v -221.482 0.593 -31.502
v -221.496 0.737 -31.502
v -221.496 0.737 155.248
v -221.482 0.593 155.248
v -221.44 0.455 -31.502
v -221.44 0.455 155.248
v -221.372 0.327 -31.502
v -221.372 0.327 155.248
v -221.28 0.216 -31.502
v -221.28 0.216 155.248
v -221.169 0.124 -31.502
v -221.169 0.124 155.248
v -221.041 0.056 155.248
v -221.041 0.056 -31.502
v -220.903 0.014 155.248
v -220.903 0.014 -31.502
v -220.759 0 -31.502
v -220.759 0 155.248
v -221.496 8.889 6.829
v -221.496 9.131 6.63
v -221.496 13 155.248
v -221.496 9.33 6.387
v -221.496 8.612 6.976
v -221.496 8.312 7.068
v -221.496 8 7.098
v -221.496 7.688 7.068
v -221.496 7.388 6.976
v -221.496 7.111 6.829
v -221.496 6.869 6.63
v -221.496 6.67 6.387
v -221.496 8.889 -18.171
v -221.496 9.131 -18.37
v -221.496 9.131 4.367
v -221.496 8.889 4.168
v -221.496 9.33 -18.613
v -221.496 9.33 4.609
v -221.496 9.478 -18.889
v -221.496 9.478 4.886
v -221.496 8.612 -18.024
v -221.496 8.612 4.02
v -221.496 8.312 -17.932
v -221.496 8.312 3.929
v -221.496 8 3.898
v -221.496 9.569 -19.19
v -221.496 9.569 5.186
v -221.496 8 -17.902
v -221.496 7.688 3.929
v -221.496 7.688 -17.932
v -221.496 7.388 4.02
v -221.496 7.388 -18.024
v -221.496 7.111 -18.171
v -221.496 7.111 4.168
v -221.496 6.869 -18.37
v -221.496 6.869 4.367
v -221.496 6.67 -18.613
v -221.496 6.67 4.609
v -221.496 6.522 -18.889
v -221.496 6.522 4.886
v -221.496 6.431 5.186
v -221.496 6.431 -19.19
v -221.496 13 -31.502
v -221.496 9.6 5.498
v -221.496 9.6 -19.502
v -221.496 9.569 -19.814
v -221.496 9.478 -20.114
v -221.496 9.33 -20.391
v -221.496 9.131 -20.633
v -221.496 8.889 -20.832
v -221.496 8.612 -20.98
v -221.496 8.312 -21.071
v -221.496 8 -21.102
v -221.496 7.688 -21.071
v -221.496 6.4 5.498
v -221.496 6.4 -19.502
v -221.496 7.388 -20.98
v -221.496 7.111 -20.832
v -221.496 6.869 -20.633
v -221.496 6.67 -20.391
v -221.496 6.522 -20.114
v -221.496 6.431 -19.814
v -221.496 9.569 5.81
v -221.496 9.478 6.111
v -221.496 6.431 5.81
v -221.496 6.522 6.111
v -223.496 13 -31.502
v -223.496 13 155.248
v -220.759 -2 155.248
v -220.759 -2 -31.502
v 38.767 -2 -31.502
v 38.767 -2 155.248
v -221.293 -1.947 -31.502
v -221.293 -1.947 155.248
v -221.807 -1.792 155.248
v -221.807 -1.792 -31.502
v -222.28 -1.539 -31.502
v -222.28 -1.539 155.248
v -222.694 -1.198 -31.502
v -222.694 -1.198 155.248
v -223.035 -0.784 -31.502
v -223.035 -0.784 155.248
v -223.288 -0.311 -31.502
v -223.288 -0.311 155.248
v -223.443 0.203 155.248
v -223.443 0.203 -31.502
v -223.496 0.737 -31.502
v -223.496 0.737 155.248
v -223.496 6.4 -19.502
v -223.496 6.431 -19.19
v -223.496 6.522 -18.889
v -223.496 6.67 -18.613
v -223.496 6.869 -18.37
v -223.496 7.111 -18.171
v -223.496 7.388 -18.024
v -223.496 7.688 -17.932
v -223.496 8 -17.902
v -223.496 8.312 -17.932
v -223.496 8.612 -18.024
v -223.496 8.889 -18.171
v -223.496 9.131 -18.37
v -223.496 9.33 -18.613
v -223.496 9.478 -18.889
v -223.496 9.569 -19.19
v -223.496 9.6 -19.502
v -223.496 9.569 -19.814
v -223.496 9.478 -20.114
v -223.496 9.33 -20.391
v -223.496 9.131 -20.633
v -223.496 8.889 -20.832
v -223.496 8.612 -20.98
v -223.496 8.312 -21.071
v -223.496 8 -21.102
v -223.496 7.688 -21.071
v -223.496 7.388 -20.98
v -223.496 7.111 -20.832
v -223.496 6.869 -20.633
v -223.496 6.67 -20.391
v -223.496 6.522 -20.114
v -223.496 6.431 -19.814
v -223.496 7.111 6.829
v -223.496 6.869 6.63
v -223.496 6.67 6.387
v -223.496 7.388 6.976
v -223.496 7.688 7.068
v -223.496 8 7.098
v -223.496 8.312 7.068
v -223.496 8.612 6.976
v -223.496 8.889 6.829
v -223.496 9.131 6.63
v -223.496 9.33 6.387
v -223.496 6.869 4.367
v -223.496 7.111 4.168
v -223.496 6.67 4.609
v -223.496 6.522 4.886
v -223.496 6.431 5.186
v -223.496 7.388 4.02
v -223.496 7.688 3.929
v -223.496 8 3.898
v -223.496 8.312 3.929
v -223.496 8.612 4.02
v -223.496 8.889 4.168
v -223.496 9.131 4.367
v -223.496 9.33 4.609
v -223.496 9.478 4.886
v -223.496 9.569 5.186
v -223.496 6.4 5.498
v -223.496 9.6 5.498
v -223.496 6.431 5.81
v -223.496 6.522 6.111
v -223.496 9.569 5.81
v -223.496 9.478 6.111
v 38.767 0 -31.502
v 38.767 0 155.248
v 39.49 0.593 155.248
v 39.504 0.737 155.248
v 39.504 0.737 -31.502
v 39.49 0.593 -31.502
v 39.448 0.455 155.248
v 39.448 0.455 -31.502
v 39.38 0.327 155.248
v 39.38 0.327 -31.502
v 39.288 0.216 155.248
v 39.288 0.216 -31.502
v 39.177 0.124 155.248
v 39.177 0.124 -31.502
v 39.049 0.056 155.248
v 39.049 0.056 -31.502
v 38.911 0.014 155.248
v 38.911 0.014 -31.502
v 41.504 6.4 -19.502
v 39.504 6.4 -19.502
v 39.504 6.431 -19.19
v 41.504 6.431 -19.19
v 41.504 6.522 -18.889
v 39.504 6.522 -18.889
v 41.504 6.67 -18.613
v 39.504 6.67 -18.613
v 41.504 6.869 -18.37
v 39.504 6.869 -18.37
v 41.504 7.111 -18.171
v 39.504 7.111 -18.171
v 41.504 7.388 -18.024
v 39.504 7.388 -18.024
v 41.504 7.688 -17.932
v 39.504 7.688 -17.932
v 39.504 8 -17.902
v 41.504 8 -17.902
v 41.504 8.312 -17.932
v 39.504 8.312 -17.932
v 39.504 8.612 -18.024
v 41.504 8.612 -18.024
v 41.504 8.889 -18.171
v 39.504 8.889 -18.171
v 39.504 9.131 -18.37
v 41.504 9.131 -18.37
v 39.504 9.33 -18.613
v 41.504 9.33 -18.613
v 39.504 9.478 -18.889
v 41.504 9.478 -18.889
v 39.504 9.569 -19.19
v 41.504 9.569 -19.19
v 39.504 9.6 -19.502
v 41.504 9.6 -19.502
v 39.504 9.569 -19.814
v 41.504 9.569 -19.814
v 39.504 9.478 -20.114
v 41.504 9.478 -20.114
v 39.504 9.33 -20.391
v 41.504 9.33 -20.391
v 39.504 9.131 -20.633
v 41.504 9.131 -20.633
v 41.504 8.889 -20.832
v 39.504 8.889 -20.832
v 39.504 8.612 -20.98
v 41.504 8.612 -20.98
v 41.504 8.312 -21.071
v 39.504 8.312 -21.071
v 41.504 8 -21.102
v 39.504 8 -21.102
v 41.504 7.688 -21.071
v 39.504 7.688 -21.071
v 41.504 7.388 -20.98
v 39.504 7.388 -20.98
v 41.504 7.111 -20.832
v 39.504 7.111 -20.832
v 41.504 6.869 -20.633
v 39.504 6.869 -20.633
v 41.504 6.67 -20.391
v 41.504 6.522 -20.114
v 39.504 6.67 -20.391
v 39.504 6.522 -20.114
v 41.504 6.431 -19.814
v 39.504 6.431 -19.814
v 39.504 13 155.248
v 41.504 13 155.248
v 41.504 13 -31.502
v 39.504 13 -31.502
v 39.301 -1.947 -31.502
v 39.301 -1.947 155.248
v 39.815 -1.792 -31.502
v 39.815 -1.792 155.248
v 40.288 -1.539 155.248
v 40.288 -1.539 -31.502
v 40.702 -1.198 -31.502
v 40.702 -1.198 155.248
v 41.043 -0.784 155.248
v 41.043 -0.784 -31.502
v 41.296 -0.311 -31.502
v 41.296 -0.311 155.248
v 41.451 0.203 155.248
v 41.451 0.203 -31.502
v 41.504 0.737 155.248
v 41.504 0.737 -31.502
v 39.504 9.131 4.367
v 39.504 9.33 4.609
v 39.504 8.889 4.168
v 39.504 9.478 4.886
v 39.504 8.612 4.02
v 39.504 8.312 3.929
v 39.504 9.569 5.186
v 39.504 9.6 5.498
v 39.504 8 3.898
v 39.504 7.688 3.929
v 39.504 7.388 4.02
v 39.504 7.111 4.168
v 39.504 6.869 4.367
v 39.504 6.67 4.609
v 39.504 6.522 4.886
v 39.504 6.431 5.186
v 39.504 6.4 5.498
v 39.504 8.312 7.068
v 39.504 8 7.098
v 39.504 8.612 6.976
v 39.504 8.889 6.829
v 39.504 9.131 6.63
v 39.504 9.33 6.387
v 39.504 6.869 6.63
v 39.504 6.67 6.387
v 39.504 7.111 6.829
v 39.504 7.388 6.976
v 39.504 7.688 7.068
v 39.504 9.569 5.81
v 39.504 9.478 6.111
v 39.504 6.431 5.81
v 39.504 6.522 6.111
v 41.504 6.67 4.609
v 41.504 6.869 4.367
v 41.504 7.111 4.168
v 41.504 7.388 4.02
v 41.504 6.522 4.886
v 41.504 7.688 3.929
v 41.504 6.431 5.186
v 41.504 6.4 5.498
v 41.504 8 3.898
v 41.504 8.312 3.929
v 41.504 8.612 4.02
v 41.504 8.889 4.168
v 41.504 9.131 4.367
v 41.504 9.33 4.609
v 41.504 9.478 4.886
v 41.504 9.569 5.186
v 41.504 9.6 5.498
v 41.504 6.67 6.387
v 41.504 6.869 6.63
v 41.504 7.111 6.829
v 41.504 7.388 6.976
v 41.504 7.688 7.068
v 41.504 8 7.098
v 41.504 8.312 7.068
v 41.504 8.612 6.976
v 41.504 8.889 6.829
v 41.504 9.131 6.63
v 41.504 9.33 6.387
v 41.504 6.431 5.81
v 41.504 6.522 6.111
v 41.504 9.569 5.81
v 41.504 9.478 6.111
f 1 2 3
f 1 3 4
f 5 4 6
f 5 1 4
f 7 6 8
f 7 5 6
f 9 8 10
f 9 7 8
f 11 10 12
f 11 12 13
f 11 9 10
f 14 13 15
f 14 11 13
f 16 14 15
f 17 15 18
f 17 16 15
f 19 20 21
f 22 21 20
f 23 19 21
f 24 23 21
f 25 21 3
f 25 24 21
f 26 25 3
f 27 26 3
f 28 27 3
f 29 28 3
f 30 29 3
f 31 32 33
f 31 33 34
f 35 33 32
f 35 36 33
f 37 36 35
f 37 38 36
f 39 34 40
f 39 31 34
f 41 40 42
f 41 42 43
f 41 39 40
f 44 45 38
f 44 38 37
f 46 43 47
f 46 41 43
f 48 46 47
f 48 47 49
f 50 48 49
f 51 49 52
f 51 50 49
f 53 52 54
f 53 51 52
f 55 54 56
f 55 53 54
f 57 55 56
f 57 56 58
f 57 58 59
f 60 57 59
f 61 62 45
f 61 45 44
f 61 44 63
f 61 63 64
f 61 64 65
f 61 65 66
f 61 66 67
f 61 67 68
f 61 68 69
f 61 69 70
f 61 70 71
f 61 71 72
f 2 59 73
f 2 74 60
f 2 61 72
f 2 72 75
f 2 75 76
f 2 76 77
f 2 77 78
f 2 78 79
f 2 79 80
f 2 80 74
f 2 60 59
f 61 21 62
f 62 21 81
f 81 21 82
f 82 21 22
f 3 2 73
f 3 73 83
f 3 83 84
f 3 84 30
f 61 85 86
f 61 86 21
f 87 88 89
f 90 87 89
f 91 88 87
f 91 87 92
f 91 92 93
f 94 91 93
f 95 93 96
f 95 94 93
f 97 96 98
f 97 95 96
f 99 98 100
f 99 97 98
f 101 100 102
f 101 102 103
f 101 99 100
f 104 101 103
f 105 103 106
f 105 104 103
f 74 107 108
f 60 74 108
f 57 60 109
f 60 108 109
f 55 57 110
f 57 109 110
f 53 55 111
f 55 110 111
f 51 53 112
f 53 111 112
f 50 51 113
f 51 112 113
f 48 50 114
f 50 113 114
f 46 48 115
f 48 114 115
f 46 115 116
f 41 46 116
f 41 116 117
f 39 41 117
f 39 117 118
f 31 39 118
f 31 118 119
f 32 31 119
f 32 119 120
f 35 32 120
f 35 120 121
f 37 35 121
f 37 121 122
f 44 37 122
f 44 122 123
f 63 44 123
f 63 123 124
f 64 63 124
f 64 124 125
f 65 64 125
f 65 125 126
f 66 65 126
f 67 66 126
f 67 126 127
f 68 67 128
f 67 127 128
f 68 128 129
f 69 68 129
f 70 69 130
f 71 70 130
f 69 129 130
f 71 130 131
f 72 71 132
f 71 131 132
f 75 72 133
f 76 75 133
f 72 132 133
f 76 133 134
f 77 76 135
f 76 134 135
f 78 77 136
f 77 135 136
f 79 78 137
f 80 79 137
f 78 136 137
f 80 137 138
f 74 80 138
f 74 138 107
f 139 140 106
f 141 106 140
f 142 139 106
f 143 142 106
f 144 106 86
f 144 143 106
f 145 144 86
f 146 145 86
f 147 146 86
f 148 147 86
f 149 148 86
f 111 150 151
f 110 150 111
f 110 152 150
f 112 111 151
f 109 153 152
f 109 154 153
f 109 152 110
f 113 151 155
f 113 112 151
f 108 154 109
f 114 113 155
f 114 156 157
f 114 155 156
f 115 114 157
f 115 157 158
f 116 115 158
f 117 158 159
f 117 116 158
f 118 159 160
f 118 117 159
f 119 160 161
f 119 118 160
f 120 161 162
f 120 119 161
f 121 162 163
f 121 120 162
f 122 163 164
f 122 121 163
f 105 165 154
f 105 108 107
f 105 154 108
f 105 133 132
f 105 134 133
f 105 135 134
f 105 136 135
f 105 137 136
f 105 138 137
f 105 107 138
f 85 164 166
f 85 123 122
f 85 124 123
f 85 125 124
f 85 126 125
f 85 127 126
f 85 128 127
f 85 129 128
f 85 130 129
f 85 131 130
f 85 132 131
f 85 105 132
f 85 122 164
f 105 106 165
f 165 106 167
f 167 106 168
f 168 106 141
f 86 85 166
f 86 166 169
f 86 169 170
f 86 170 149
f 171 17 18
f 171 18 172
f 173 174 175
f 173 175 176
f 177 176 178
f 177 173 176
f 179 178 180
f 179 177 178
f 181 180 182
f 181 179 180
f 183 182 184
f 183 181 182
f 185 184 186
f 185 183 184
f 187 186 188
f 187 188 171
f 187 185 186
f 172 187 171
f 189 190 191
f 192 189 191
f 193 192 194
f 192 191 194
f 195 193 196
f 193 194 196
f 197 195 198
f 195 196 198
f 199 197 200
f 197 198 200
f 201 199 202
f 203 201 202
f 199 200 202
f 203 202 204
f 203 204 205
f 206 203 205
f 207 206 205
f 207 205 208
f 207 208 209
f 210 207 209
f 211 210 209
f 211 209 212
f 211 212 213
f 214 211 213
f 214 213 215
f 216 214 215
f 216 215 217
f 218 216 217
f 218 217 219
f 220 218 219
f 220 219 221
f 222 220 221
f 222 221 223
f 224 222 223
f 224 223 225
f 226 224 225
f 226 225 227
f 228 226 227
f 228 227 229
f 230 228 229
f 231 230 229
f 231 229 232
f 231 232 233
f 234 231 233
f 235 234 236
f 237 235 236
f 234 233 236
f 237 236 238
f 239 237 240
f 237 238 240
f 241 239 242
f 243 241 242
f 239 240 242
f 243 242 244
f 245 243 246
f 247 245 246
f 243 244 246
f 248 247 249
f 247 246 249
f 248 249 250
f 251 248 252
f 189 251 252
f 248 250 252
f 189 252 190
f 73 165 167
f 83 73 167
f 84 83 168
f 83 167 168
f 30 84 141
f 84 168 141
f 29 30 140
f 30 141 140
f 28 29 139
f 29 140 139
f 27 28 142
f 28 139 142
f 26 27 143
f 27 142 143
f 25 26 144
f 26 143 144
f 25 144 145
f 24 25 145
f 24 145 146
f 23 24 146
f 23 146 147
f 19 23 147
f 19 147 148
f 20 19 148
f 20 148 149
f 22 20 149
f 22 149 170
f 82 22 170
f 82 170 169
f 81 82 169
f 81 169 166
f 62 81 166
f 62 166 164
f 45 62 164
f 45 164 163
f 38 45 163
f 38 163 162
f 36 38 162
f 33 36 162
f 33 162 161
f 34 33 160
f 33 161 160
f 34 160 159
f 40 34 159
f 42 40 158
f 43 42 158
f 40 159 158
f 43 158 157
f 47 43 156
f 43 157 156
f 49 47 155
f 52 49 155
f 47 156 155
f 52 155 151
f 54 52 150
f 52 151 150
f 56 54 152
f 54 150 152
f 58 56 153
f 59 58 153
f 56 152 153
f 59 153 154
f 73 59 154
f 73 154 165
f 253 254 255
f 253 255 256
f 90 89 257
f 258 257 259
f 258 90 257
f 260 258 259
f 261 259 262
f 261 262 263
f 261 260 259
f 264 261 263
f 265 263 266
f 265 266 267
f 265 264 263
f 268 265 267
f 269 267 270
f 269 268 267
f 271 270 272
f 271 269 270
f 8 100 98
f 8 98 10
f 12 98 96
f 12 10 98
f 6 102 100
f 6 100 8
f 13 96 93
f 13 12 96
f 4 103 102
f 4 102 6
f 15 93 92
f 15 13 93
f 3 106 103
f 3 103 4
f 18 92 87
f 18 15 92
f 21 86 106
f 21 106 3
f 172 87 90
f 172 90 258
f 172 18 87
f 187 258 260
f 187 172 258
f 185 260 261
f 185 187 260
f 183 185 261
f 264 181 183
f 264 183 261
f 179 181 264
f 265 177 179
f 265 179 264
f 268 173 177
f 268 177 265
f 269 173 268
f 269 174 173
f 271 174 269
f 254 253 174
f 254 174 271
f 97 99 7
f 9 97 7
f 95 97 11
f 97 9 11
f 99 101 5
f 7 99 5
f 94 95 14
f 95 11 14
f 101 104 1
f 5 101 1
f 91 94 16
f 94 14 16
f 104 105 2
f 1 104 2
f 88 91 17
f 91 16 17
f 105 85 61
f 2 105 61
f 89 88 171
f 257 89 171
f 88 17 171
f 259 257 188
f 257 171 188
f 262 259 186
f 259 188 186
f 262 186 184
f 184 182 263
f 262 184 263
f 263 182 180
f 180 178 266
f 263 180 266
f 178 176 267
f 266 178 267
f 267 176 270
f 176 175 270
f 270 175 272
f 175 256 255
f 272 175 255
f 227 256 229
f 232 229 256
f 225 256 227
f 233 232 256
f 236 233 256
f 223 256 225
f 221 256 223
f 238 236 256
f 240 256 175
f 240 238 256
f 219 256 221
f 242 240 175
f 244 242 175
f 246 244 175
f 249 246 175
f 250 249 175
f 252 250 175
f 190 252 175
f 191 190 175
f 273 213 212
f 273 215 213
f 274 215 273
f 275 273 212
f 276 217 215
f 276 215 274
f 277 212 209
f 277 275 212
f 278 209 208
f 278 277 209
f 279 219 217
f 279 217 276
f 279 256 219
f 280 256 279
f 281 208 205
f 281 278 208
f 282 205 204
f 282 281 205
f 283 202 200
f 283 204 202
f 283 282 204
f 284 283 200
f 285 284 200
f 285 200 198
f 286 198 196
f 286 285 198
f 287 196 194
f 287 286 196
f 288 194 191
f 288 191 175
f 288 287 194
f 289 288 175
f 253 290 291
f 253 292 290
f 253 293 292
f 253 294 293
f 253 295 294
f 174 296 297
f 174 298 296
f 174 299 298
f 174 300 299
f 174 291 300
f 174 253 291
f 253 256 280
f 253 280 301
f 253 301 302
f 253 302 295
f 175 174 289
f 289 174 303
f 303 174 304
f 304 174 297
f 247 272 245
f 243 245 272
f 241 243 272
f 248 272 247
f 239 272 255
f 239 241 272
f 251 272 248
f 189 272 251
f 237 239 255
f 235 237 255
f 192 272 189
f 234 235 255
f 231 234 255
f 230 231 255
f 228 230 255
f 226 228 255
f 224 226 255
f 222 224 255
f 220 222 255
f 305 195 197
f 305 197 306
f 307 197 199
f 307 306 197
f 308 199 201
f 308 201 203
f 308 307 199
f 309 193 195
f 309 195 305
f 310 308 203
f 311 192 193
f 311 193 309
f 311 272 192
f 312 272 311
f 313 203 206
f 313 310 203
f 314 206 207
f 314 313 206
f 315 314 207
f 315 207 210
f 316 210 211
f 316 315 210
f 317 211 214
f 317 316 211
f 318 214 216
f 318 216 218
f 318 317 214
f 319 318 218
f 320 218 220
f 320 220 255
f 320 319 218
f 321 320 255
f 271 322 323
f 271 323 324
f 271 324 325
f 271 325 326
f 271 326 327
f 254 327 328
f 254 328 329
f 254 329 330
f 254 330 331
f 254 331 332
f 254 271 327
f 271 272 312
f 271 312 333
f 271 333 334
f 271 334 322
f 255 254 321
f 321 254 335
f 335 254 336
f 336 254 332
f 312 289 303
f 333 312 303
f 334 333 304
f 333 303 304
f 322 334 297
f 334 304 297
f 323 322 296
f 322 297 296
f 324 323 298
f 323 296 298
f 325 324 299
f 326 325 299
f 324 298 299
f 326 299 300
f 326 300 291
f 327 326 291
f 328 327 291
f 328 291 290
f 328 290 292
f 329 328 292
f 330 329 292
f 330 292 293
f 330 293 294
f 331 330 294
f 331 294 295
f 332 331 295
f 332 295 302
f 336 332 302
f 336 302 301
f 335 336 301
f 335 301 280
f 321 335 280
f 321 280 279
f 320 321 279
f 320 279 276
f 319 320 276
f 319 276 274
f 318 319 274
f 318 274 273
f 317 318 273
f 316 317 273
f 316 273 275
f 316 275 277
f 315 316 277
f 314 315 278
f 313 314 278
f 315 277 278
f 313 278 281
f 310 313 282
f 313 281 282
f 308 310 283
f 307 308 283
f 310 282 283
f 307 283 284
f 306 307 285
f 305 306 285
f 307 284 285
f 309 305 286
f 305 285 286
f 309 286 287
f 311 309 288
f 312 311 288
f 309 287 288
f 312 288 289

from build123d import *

# Parameters (mm, degrees)
SKETCH_1_W                         = 265
SKETCH_1_H                         = 186.75
SM_BASE_FLANGE_1_DEPTH             = 2
SM_EDGE_FLANGE_1_STRIP_W           = 9.4732
SM_EDGE_FLANGE_1_STRIP_H           = 2
SM_EDGE_FLANGE_1_STRIP_CUT_DEPTH   = 186.75
SM_EDGE_FLANGE_1_STRIP_2_W         = 9.4732
SM_EDGE_FLANGE_1_STRIP_2_H         = 2
SM_EDGE_FLANGE_1_STRIP_CUT_2_DEPTH = 186.75
SM_EDGE_FLANGE_1_DEPTH             = 186.75
SM_EDGE_FLANGE_1_BEND_DEPTH        = 186.75
SKETCH_12_R                        = 1.6
CUT_EXTRUDE_1_DEPTH                = 281


# Sheet-metal steps are written as plain solids
with BuildPart() as part:
    # Sketch 1 → Базовая кромка1 (new body)
    with BuildSketch(Plane(origin=(0, 0, 0), x_dir=(1, 0, 0), z_dir=(0, 1, 0))):
        with Locations((-90.995998399, -61.873281816)):
            Rectangle(SKETCH_1_W, SKETCH_1_H)
    extrude(amount=-SM_BASE_FLANGE_1_DEPTH)

    # Ребро-кромка1 strip (across the edge) → Ребро-кромка1 strip cut (cut)
    with BuildSketch(Plane(origin=(-223.495998399, 0, -31.501718184), x_dir=(1, 0, 0), z_dir=(0, 0, 1))):
        with Locations((-2, -1)):
            Rectangle(SM_EDGE_FLANGE_1_STRIP_W, SM_EDGE_FLANGE_1_STRIP_H)
    extrude(amount=SM_EDGE_FLANGE_1_STRIP_CUT_DEPTH, mode=Mode.SUBTRACT)

    # Ребро-кромка1 strip 2 (across the edge) → Ребро-кромка1 strip cut 2 (cut)
    with BuildSketch(Plane(origin=(41.504001601, 0, 155.248281816), x_dir=(-1, 0, 0), z_dir=(0, 0, -1))):
        with Locations((-2, -1)):
            Rectangle(SM_EDGE_FLANGE_1_STRIP_2_W, SM_EDGE_FLANGE_1_STRIP_2_H)
    extrude(amount=SM_EDGE_FLANGE_1_STRIP_CUT_2_DEPTH, mode=Mode.SUBTRACT)

    # Ребро-кромка1 section (across the edge) → Ребро-кромка1 (add)
    with BuildSketch(Plane(origin=(-223.495998399, 0, -31.501718184), x_dir=(1, 0, 0), z_dir=(0, 0, 1))):
        with BuildLine():
            Line((0, 0.7366), (0, 13))
            Line((0, 13), (2, 13))
            Line((2, 13), (2, 0.7366))
            ThreePointArc((2, 0.7366), (2.215745145, 0.215745145), (2.7366, 0))
            Line((2.7366, 0), (2.7366, -2))
            ThreePointArc((2.7366, -2), (0.801531583, -1.198468417), (0, 0.7366))
        make_face()
    extrude(amount=SM_EDGE_FLANGE_1_DEPTH)

    # Ребро-кромка1 section 2 (across the edge) → Ребро-кромка1 bend (add)
    with BuildSketch(Plane(origin=(41.504001601, 0, 155.248281816), x_dir=(-1, 0, 0), z_dir=(0, 0, -1))):
        with BuildLine():
            Line((0, 0.7366), (0, 13))
            Line((0, 13), (2, 13))
            Line((2, 13), (2, 0.7366))
            ThreePointArc((2, 0.7366), (2.215745145, 0.215745145), (2.7366, 0))
            Line((2.7366, 0), (2.7366, -2))
            ThreePointArc((2.7366, -2), (0.801531583, -1.198468417), (0, 0.7366))
        make_face()
    extrude(amount=SM_EDGE_FLANGE_1_BEND_DEPTH)

    # Эскиз12 → Вырез-Вытянуть1 (cut)
    with BuildSketch(Plane.ZY.offset(223.495998399)):
        with Locations(Location((-19.501718184, 8, 0), (0, 0, 270))):
            Circle(SKETCH_12_R)
        with Locations(Location((5.498281816, 8, 0), (0, 0, 270))):
            Circle(SKETCH_12_R)
    extrude(amount=-CUT_EXTRUDE_1_DEPTH, mode=Mode.SUBTRACT)


solid = part.part
